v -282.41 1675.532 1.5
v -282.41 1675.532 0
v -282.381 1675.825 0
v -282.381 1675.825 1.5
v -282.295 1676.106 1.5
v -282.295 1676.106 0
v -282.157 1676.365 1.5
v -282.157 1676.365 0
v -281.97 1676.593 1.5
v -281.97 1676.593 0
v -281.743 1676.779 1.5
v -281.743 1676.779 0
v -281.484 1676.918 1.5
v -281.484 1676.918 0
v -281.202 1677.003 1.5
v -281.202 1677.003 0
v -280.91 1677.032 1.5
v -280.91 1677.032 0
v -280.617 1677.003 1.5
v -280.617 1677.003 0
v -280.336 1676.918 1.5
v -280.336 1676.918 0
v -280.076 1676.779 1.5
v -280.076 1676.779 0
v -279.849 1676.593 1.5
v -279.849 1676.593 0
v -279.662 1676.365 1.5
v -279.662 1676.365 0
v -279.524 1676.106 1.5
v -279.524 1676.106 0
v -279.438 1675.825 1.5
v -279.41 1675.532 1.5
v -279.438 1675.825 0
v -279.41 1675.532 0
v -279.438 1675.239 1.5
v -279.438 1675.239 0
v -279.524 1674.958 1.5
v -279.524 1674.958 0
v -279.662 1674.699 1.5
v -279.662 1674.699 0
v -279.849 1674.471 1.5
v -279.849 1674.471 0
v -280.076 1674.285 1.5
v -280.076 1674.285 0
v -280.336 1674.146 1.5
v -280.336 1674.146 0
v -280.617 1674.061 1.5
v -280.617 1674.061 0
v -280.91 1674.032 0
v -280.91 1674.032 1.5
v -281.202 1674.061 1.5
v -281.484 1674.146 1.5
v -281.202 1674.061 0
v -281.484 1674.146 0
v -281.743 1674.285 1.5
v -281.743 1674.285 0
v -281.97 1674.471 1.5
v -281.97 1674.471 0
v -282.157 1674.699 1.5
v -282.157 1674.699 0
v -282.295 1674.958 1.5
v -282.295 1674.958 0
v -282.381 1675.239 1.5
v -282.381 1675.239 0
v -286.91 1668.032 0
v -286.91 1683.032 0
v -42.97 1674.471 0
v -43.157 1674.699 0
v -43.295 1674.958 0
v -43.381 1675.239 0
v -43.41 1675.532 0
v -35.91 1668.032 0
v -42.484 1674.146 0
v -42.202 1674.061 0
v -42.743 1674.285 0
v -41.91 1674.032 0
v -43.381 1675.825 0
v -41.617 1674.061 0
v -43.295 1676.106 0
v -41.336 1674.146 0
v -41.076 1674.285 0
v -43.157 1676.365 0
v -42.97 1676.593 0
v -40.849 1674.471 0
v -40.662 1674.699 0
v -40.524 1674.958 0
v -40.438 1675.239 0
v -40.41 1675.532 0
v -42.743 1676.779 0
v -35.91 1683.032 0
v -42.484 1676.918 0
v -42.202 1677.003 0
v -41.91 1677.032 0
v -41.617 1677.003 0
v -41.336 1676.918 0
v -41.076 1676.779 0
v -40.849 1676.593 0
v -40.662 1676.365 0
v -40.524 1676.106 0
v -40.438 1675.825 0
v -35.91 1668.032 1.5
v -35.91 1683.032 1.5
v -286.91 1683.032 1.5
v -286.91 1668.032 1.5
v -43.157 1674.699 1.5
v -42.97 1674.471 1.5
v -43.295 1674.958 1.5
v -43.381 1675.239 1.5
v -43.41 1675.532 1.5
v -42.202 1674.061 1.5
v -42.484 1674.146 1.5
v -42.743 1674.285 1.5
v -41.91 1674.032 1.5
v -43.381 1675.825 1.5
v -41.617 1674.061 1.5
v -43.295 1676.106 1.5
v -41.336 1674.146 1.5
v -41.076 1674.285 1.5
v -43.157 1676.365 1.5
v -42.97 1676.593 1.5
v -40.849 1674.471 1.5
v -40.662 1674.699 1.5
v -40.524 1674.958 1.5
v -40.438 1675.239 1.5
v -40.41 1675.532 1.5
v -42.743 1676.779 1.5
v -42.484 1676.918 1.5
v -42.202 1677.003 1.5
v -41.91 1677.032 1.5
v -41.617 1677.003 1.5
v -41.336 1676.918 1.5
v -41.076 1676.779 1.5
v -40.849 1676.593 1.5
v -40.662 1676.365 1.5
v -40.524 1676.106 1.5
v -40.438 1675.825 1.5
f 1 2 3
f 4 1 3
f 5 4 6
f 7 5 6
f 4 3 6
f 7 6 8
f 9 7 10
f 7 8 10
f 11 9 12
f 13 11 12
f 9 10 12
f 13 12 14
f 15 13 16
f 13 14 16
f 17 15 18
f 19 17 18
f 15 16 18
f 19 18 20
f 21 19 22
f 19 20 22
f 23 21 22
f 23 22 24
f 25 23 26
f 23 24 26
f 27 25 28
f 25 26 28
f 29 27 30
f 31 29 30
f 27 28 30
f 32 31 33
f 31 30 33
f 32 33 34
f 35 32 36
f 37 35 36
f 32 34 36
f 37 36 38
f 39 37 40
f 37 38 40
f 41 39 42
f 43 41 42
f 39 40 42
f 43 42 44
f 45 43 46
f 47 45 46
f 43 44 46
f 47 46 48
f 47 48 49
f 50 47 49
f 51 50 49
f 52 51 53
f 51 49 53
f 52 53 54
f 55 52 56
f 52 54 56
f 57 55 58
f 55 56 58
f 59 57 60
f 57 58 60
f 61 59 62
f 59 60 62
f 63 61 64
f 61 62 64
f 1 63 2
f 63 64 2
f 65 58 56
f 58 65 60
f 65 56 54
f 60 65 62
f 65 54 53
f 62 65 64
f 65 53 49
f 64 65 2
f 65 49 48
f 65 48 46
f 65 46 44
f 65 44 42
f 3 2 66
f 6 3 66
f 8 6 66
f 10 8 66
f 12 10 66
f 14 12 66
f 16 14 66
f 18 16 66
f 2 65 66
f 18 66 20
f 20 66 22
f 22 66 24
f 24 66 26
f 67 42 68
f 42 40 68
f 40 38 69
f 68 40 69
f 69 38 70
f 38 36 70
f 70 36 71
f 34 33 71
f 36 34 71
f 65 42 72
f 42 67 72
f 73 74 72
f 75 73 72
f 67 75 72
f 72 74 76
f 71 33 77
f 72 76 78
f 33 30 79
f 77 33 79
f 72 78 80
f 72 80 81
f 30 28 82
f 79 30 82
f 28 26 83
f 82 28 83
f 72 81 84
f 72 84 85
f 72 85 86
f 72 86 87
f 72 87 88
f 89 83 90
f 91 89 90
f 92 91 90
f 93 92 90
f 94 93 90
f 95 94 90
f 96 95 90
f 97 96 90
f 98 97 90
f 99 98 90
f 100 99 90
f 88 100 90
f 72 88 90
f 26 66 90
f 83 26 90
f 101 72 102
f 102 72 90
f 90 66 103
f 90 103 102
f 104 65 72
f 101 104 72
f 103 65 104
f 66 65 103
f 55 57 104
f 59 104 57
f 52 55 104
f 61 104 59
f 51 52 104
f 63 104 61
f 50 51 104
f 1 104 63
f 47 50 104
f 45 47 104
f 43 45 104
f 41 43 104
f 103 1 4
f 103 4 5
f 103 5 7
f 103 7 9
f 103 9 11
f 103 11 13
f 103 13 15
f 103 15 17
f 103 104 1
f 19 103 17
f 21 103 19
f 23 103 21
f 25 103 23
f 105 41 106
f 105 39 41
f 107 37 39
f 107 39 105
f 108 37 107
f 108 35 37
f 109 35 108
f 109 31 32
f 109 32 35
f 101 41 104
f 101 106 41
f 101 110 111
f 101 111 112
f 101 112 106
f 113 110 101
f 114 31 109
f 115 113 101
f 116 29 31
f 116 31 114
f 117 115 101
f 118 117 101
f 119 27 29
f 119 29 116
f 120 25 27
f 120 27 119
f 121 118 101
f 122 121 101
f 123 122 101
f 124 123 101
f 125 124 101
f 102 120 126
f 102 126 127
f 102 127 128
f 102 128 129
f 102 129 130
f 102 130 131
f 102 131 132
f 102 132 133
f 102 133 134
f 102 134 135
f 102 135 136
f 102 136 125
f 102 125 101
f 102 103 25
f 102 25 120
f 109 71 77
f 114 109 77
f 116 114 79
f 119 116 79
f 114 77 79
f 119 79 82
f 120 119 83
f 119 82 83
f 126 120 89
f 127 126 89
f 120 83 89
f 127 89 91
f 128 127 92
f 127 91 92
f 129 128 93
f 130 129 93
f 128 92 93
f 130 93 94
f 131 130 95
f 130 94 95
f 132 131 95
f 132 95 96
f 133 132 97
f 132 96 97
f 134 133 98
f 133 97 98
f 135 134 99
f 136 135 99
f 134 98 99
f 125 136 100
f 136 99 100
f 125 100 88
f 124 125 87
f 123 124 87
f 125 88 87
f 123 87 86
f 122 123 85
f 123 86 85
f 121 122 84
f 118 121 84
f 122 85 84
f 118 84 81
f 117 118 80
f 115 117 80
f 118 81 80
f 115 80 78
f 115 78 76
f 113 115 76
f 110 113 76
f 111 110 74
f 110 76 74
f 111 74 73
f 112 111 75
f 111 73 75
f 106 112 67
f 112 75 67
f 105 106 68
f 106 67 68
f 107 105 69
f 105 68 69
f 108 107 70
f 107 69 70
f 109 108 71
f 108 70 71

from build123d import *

# Parameters (mm, degrees)
ESQUISSE1_W      = 251
ESQUISSE1_H      = 15
EXTRUSION1_DEPTH = 1.5
ESQUISSE2_R      = 1.5
EXTRUSION2_DEPTH = 1.5


with BuildPart() as part:
    # Esquisse1 → Extrusion1 (new body)
    with BuildSketch(Plane.XY):
        with Locations((-161.409577855, 1675.531969937)):
            Rectangle(ESQUISSE1_W, ESQUISSE1_H)
    extrude(amount=EXTRUSION1_DEPTH)

    # Esquisse2 → Extrusion2 (cut)
    with BuildSketch(Plane(origin=(0, 0, 0), x_dir=(-1, 0, 0), z_dir=(0, 0, -1))):
        with Locations((280.909577855, 1675.531969937)):
            Circle(ESQUISSE2_R)
        with Locations((41.909577855, 1675.531969937)):
            Circle(ESQUISSE2_R)
    extrude(amount=-EXTRUSION2_DEPTH, mode=Mode.SUBTRACT)


solid = part.part
